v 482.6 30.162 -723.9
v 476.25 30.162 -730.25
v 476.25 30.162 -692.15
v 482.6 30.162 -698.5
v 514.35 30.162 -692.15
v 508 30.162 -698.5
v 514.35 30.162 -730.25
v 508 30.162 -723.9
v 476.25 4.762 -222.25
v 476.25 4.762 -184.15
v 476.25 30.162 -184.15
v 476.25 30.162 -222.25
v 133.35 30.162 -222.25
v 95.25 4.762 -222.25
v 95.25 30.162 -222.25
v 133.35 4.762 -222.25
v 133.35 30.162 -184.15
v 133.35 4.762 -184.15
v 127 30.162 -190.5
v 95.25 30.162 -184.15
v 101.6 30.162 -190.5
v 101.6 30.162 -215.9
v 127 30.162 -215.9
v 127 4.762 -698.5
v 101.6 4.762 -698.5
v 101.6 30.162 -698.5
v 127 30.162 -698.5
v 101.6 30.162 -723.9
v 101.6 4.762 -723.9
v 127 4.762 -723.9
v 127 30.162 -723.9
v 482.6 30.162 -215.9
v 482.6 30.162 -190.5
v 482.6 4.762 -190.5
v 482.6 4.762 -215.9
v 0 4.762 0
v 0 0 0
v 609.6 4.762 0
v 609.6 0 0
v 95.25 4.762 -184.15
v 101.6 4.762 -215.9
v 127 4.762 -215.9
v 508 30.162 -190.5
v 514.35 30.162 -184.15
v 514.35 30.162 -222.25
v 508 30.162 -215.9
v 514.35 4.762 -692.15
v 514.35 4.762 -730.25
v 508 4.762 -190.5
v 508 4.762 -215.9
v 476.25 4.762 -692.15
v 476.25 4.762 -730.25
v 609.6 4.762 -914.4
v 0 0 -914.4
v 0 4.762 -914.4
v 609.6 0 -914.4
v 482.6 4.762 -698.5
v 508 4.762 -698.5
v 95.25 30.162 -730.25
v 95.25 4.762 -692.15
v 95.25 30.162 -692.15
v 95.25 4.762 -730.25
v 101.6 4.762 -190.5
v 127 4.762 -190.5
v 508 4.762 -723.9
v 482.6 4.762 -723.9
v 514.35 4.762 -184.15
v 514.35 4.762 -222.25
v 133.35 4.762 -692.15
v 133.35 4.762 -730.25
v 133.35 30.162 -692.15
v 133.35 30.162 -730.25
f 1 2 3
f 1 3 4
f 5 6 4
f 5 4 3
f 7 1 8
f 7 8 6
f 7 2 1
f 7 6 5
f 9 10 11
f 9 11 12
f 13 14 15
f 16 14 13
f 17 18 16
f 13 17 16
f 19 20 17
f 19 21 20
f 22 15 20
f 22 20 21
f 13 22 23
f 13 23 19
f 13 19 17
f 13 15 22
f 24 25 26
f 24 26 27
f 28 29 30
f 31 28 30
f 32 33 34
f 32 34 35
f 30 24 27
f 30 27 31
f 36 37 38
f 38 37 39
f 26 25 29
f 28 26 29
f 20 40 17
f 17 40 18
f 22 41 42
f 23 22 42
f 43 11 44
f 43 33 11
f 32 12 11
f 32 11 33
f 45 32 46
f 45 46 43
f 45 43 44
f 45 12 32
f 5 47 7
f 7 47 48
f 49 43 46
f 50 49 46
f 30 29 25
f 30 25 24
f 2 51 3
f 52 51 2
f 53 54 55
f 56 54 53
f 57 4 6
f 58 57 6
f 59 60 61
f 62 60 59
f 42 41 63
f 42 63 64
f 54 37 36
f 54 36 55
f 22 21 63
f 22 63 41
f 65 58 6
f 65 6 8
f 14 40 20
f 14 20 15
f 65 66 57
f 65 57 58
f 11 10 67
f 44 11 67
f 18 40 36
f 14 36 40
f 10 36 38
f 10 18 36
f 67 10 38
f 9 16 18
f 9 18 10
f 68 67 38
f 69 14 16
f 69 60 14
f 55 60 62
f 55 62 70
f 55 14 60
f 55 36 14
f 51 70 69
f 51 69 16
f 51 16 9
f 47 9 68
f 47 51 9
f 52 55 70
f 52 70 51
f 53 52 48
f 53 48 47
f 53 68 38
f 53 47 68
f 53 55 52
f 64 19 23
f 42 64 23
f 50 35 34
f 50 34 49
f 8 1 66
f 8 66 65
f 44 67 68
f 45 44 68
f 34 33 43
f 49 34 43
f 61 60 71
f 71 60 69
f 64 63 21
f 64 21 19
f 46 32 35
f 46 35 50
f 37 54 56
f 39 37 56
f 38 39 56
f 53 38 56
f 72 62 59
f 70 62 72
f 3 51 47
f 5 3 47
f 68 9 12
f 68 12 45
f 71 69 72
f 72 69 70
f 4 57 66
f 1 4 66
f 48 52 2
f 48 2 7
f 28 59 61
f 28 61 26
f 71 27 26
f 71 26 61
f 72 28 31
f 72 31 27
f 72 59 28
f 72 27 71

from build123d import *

# Parameters (mm, degrees)
SKETCH1_W           = 609.6
SKETCH1_H           = 914.4
BOSS_EXTRUDE1_DEPTH = 4.7625
SKETCH4_W           = 38.1
SKETCH4_H           = 38.1
SKETCH4_W_2         = 25.4
SKETCH4_H_2         = 25.4
BOSS_EXTRUDE2_DEPTH = 25.4


with BuildPart() as part:
    # Sketch1 → Boss-Extrude1 (new body)
    with BuildSketch(Plane(origin=(0, 0, 0), x_dir=(1, 0, 0), z_dir=(0, 1, 0))):
        with Locations((304.8, 457.2)):
            Rectangle(SKETCH1_W, SKETCH1_H)
    extrude(amount=BOSS_EXTRUDE1_DEPTH)

    # Sketch4 → Boss-Extrude2 (add)
    with BuildSketch(Plane(origin=(0, 4.7625, 0), x_dir=(1, 0, 0), z_dir=(0, 1, 0))):
        with Locations((114.3, 711.2)):
            Rectangle(SKETCH4_W, SKETCH4_H)
        with Locations((114.3, 711.2)):
            Rectangle(SKETCH4_W_2, SKETCH4_H_2, mode=Mode.SUBTRACT)
        with Locations((495.3, 711.2)):
            Rectangle(SKETCH4_W, SKETCH4_H)
        with Locations((495.3, 711.2)):
            Rectangle(SKETCH4_W_2, SKETCH4_H_2, mode=Mode.SUBTRACT)
        with Locations((495.3, 203.2)):
            Rectangle(SKETCH4_W, SKETCH4_H)
        with Locations((495.3, 203.2)):
            Rectangle(SKETCH4_W_2, SKETCH4_H_2, mode=Mode.SUBTRACT)
        with Locations((114.3, 203.2)):
            Rectangle(SKETCH4_W, SKETCH4_H)
        with Locations((114.3, 203.2)):
            Rectangle(SKETCH4_W_2, SKETCH4_H_2, mode=Mode.SUBTRACT)
    extrude(amount=BOSS_EXTRUDE2_DEPTH)


solid = part.part
